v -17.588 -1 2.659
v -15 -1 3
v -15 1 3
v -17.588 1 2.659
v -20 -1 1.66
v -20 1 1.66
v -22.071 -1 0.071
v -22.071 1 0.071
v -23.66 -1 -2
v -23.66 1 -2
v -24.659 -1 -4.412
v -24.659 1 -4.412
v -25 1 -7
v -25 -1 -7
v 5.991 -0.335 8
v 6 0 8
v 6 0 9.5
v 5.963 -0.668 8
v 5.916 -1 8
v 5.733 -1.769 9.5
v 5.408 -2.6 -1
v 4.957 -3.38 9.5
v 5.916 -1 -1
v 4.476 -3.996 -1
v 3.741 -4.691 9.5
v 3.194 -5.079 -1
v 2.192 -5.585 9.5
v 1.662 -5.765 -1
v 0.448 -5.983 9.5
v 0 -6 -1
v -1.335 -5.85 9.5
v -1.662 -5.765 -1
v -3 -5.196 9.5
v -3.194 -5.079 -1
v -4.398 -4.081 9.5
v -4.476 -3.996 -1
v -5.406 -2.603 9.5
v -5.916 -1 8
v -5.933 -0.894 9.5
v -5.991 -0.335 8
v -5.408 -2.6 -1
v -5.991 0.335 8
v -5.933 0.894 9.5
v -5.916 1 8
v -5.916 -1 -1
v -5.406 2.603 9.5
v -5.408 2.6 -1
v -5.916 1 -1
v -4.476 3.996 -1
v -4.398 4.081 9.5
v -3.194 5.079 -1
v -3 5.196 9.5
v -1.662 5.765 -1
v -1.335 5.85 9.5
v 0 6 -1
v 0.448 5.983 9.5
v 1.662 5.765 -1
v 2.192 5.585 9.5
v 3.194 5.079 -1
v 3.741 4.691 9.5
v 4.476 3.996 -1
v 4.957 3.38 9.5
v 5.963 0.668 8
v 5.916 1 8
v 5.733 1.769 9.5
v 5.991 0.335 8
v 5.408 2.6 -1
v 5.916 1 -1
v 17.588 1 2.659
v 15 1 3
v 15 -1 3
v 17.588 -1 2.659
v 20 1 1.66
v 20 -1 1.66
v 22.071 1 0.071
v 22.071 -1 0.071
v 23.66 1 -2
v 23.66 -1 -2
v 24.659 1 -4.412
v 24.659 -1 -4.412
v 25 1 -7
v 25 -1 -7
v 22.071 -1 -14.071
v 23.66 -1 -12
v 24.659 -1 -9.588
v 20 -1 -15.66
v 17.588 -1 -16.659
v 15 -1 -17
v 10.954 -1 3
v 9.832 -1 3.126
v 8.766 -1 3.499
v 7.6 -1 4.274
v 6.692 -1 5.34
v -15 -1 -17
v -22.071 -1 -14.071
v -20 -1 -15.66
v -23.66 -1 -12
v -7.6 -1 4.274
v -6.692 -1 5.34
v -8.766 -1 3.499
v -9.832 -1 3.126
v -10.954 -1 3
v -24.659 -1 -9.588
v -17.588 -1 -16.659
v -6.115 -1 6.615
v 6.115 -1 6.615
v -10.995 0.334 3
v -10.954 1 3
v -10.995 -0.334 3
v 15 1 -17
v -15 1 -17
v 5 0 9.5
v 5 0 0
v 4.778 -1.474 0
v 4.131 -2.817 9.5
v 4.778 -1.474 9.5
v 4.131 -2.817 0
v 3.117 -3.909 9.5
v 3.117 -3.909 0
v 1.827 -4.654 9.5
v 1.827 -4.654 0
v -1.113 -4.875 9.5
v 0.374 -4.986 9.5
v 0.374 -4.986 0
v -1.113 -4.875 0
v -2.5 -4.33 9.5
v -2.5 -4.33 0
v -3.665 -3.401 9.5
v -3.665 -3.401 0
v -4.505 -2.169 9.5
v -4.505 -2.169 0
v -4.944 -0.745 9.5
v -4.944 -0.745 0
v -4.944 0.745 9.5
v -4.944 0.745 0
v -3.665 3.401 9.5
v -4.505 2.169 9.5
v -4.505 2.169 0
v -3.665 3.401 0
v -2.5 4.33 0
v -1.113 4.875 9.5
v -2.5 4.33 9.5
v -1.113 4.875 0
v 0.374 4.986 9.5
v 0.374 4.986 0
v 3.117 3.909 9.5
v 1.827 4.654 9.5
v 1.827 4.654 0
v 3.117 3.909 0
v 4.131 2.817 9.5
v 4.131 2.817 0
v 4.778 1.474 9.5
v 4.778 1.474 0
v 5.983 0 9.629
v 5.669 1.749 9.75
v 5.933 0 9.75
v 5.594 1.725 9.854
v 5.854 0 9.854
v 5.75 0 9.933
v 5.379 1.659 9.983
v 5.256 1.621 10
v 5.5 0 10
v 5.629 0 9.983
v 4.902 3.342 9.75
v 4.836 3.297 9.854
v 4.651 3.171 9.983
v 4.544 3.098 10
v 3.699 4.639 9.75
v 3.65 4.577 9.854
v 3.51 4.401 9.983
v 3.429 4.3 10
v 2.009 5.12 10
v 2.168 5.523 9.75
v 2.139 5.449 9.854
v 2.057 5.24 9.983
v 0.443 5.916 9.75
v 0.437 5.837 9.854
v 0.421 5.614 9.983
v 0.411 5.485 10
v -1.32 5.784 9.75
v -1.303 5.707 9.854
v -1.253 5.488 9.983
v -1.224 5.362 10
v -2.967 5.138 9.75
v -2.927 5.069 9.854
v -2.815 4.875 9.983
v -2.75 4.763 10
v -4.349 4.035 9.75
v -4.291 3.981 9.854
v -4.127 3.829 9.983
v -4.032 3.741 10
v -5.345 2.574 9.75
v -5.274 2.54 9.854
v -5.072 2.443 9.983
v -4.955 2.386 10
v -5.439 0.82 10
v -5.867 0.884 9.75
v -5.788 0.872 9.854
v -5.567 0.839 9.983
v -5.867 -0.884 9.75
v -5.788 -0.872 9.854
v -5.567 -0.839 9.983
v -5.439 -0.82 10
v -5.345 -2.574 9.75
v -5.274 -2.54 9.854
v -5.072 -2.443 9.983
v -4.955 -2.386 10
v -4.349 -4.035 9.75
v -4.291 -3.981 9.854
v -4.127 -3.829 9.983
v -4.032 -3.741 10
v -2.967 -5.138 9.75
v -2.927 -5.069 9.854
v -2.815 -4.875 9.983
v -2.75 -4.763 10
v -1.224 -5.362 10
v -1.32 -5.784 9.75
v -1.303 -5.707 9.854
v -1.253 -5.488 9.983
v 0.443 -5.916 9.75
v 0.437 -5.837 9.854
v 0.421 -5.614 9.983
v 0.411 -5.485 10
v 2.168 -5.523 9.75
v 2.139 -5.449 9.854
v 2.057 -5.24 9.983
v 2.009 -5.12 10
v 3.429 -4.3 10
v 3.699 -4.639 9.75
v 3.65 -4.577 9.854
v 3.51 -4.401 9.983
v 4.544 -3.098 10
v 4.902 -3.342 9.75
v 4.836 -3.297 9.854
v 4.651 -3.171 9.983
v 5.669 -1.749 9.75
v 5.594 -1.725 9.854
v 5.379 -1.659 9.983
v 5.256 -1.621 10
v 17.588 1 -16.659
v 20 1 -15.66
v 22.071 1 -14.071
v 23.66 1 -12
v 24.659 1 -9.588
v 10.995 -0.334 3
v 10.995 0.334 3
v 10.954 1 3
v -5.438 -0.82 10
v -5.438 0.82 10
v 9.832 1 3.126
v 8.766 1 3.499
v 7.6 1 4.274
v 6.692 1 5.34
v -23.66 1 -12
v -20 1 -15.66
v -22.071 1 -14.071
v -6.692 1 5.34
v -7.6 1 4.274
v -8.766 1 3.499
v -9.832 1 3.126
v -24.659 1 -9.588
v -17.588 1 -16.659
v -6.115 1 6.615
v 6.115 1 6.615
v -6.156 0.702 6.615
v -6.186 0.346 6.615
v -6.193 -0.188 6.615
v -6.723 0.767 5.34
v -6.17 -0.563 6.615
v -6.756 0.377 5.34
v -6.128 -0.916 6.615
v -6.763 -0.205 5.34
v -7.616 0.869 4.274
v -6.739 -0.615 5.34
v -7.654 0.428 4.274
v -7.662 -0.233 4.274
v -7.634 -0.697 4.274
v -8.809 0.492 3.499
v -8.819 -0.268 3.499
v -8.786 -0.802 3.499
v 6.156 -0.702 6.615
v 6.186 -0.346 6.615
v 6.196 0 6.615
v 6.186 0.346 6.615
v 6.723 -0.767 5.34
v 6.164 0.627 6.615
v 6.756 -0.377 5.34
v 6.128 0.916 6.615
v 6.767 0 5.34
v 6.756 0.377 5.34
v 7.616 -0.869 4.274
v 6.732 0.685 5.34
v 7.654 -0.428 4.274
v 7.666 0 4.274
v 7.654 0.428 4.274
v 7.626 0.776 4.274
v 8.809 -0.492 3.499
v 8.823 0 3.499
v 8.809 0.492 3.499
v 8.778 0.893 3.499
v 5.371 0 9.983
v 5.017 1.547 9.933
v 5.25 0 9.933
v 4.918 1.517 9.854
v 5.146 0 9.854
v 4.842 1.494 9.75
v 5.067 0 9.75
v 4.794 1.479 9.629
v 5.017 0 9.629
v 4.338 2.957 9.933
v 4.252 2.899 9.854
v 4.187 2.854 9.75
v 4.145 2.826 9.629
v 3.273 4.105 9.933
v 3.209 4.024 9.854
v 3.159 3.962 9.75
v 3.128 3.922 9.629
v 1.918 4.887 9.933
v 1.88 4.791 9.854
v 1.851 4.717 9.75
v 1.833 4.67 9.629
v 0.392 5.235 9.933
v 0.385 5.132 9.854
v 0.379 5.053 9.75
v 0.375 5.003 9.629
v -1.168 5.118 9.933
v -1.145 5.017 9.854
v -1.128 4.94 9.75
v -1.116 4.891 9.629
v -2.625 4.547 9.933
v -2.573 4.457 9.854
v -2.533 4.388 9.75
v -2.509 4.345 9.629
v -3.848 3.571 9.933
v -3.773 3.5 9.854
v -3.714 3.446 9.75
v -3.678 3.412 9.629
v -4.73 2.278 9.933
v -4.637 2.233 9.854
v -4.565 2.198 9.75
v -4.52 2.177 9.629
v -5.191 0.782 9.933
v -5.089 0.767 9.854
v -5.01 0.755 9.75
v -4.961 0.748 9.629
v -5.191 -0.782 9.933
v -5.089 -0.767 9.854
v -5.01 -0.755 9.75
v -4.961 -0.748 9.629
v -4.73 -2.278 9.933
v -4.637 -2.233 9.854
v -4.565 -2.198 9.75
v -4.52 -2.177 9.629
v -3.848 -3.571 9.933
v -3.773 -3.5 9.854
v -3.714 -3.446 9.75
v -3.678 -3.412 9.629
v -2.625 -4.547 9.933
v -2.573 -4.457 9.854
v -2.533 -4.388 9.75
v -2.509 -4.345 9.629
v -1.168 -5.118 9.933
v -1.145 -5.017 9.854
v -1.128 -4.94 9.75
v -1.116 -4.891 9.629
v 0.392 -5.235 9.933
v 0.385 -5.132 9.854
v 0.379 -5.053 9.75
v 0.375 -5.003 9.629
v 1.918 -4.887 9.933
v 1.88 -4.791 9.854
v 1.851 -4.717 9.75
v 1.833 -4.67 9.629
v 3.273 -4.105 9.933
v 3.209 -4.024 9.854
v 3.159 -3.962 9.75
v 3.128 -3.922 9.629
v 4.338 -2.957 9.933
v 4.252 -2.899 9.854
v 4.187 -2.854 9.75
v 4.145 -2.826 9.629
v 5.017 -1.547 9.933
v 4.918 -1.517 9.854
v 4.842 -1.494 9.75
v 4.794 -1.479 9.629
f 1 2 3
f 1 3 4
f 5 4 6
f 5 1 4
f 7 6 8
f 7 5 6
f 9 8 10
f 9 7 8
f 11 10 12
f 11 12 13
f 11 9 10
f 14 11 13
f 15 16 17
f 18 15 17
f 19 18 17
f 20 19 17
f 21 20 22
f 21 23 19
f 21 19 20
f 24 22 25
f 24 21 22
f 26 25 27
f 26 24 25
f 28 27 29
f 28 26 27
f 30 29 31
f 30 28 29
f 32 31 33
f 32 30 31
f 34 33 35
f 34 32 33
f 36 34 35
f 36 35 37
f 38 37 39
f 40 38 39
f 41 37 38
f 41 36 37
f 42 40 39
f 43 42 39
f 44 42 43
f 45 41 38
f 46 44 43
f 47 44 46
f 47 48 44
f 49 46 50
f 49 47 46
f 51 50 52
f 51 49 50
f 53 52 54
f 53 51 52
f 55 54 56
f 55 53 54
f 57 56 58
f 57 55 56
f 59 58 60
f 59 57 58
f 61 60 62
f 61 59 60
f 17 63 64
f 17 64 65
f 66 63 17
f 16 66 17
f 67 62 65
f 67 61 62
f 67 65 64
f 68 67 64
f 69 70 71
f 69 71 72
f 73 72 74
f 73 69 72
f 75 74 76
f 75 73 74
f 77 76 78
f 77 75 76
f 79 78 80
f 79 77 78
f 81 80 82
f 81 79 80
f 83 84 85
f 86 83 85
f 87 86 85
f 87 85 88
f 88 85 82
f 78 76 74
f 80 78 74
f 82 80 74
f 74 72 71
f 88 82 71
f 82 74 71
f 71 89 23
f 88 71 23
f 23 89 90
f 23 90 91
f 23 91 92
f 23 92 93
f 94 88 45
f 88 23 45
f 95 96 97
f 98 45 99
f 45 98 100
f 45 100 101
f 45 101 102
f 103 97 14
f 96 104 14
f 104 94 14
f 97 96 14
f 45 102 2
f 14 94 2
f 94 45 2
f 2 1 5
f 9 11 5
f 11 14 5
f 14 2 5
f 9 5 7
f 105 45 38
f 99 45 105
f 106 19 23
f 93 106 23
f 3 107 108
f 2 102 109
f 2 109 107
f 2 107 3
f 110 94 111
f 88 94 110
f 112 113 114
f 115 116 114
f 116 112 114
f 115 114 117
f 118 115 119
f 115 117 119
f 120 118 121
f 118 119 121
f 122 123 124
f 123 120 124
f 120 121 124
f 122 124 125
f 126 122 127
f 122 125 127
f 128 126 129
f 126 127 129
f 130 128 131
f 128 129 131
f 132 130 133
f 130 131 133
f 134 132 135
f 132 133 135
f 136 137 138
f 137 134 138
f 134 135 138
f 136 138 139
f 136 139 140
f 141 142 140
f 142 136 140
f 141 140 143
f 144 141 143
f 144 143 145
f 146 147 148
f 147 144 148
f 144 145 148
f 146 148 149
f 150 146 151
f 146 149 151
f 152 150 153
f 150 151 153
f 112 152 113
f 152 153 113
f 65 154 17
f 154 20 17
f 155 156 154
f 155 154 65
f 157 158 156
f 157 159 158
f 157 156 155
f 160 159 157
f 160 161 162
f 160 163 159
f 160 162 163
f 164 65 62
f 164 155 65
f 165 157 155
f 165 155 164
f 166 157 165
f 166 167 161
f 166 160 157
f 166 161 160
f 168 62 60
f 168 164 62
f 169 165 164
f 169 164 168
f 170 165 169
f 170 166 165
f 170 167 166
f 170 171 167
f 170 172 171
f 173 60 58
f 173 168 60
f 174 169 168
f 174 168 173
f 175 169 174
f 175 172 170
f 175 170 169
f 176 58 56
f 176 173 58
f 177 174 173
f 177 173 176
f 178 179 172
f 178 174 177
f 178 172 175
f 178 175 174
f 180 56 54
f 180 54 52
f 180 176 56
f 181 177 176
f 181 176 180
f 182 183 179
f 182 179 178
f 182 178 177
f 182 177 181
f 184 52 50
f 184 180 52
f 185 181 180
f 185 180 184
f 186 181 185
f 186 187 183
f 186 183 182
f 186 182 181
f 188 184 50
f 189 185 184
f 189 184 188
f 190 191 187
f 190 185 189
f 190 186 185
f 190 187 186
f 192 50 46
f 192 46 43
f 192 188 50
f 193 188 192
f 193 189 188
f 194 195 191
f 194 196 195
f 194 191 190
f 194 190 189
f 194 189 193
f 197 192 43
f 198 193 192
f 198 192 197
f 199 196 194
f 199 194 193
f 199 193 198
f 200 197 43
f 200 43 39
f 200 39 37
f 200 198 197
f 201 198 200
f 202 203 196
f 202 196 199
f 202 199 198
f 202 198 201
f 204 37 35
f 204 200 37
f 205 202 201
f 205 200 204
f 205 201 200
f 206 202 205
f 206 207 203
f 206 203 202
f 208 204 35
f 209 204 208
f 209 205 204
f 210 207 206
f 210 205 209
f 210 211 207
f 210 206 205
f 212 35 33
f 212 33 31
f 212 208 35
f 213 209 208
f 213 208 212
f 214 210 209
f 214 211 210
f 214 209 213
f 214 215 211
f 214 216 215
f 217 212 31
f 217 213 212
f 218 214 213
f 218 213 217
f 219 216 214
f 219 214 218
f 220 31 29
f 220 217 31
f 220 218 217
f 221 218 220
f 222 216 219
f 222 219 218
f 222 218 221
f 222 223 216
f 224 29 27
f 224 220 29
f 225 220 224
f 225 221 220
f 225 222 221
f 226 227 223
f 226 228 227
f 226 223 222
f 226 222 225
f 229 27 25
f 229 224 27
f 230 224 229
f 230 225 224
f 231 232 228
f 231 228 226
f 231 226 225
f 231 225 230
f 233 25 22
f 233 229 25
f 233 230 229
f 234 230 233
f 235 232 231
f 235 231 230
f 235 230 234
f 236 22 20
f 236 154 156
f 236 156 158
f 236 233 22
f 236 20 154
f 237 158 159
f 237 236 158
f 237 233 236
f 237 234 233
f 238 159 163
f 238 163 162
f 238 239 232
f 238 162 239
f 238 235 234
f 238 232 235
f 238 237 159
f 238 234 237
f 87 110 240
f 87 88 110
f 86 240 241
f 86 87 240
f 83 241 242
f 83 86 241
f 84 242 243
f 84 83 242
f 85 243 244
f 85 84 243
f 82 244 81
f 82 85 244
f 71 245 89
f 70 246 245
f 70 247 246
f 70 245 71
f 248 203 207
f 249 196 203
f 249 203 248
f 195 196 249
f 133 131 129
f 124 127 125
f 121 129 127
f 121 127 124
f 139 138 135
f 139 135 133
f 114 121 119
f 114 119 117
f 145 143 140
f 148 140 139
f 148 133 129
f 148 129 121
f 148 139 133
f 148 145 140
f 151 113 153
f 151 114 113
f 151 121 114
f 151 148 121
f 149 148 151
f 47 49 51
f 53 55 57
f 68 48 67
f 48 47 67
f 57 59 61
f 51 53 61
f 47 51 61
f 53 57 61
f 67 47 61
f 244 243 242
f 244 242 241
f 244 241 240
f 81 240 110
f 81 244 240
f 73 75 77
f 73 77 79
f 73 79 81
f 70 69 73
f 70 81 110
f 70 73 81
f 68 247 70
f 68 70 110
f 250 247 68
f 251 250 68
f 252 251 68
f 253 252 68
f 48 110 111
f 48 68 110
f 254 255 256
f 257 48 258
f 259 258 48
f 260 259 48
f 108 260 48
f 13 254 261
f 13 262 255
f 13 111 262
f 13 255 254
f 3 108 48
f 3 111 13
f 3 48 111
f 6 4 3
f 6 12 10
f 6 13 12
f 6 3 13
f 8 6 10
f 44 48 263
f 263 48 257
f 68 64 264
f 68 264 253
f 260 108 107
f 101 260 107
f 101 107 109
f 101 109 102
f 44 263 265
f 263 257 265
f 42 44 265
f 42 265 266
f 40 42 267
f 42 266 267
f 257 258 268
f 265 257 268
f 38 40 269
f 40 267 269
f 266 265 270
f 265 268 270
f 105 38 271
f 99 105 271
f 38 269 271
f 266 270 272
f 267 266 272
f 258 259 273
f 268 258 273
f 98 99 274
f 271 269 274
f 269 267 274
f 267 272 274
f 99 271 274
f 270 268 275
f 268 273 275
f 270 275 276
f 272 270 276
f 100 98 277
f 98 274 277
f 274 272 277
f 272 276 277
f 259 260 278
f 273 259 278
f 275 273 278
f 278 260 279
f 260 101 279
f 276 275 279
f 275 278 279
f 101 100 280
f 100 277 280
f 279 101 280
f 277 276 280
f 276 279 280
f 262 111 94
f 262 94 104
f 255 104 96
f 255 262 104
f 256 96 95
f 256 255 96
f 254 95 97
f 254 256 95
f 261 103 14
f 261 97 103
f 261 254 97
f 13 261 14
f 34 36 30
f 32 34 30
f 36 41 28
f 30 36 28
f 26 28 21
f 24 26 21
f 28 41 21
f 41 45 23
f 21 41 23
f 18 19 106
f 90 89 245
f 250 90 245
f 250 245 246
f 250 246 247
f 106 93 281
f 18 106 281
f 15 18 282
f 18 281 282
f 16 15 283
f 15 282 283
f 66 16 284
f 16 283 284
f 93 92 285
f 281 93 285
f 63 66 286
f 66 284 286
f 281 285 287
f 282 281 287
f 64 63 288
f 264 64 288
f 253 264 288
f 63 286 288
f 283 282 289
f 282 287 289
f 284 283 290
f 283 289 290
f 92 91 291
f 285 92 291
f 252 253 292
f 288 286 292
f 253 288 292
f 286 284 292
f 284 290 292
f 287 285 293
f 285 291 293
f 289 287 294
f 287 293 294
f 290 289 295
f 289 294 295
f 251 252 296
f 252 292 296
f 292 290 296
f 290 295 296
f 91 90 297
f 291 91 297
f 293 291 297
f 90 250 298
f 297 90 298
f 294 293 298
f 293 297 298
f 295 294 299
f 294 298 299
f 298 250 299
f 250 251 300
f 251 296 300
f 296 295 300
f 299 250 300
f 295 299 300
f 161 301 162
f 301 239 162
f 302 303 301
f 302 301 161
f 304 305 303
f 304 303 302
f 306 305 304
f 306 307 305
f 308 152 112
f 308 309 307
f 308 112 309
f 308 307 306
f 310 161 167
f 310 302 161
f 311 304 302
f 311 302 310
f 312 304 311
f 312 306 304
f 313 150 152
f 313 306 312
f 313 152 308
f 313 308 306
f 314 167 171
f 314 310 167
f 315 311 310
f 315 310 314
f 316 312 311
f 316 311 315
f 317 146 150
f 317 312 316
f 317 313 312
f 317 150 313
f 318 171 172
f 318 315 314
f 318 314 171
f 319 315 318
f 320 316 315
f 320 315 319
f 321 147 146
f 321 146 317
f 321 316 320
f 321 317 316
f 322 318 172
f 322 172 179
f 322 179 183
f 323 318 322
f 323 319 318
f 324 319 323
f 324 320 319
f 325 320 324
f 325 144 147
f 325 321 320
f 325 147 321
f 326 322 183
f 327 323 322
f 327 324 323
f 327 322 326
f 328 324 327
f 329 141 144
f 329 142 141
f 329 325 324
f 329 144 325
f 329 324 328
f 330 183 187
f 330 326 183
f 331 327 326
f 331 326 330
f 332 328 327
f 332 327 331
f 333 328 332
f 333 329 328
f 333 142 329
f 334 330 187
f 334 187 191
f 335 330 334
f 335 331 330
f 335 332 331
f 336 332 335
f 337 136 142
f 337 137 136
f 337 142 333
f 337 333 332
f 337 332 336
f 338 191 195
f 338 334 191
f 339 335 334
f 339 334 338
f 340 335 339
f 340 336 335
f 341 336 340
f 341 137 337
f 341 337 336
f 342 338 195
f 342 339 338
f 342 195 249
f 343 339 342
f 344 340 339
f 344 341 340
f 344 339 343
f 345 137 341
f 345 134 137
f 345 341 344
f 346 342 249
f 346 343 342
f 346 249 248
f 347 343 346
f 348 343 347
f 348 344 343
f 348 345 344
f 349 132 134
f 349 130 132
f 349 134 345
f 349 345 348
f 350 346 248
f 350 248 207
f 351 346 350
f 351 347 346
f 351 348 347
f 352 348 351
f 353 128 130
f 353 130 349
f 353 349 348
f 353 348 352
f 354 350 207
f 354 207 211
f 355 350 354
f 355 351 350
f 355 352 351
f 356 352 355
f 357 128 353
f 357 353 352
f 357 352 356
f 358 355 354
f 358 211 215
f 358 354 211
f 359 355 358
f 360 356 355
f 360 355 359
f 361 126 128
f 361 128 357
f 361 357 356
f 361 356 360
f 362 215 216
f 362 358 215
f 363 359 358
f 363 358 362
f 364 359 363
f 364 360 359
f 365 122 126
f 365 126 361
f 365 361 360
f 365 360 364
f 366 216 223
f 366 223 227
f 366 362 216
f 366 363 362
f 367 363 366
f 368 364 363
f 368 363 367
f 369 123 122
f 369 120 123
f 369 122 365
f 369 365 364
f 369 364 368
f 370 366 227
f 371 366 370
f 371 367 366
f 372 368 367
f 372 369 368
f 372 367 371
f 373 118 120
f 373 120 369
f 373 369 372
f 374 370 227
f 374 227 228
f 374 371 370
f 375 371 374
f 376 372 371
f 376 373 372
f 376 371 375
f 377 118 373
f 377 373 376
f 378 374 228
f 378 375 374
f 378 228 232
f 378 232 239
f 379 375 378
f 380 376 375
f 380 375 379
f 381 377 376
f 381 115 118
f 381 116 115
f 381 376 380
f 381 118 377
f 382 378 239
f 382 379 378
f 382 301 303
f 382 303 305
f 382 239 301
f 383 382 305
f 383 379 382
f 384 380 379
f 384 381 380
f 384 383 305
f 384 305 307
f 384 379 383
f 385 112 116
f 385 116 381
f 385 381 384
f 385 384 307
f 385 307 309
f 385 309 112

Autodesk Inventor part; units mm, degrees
ref_plane "YZ Plane" through (0, 0, 0) normal (1, 0, 0) x (0, 1, 0)
ref_plane "XZ Plane" through (0, 0, 0) normal (0, 1, 0) x (-1, 0, 0)
ref_plane "XY Plane" through (0, 0, 0) normal (0, 0, 1) x (1, 0, 0)
sketch "Szkic1" plane through (0, 0, 0) normal (0, 0, 1) x (1, 0, 0)
  circle A0 centre (0, 0) radius 3 projected
  circle A1 centre (0, 0) radius 6
  point P0 (0, 0)
  dimension "d0" = 12
extrude "Wyciągnięcie proste1" add sketch "Szkic1" against normal blind 1 contours A0 | A1
sketch "Szkic2" plane through (0, 0, 0) normal (0, 0, 1) x (1, 0, 0)
  circle A0 centre (0, 0) radius 6 projected
  circle A1 centre (0, 0) radius 5
  point P0 (0, 0)
  dimension "d3" = 1
extrude "Wyciągnięcie proste2" add sketch "Szkic2" along normal blind 10
full round fillet "Zaokrąglenie1" first side at (4.9353, -0.8021, 6.6667) centre faces at (5.6086, -0.4786, 10) second side at (5.9223, -0.9625, 2.6667)
sketch "Szkic3" plane through (0, 0, 0) normal (0, 1, 0) x (-1, 0, 0)
  line L0 (-6, -1) -> (6, -1) projected
  line L1 (6, 9.5) -> (-6, 9.5) projected
  line L2 (0, 3) -> (25, 3)
  line L3 (25, 3) -> (25, -17)
  line L4 (25, -17) -> (0, -17)
  line L5 (0, -17) -> (0, 3)
  line L6 (0, 3) -> (5.5, 3)
  line L7 (5.5, 3) -> (5.5, -1)
  line L8 (5.5, -1) -> (0, -1)
  line L9 (0, -1) -> (0, 3)
  point P0 (0, 0)
  point P1 (5.5, -1)
  point P2 (0, -1)
  dimension "d6" = 25
  dimension "d7" = 20
  dimension "d8" = 5.5
  dimension "d9" = 4
extrude "Wyciągnięcie proste3" add sketch "Szkic3" along normal mid plane 2 contours L0 L7 L2 L3 L4 L5
fillet "Zaokrąglenie2" radius 5 1 edges at (-6, 0, 3)
full round fillet "Zaokrąglenie3" first side at (-20.3316, -0.1112, 3) centre faces at (-25, 0.3333, -10.3333) second side at (-8.3333, -0.3333, -17)
pattern_circular "Szyk kołowy1" count 2 over 360 about axis through (0, 0, 0) along (0, 0, 1) of "Wyciągnięcie proste3", "Zaokrąglenie2", "Zaokrąglenie3"
properties part number "raczka" material "Aluminium 6061"
